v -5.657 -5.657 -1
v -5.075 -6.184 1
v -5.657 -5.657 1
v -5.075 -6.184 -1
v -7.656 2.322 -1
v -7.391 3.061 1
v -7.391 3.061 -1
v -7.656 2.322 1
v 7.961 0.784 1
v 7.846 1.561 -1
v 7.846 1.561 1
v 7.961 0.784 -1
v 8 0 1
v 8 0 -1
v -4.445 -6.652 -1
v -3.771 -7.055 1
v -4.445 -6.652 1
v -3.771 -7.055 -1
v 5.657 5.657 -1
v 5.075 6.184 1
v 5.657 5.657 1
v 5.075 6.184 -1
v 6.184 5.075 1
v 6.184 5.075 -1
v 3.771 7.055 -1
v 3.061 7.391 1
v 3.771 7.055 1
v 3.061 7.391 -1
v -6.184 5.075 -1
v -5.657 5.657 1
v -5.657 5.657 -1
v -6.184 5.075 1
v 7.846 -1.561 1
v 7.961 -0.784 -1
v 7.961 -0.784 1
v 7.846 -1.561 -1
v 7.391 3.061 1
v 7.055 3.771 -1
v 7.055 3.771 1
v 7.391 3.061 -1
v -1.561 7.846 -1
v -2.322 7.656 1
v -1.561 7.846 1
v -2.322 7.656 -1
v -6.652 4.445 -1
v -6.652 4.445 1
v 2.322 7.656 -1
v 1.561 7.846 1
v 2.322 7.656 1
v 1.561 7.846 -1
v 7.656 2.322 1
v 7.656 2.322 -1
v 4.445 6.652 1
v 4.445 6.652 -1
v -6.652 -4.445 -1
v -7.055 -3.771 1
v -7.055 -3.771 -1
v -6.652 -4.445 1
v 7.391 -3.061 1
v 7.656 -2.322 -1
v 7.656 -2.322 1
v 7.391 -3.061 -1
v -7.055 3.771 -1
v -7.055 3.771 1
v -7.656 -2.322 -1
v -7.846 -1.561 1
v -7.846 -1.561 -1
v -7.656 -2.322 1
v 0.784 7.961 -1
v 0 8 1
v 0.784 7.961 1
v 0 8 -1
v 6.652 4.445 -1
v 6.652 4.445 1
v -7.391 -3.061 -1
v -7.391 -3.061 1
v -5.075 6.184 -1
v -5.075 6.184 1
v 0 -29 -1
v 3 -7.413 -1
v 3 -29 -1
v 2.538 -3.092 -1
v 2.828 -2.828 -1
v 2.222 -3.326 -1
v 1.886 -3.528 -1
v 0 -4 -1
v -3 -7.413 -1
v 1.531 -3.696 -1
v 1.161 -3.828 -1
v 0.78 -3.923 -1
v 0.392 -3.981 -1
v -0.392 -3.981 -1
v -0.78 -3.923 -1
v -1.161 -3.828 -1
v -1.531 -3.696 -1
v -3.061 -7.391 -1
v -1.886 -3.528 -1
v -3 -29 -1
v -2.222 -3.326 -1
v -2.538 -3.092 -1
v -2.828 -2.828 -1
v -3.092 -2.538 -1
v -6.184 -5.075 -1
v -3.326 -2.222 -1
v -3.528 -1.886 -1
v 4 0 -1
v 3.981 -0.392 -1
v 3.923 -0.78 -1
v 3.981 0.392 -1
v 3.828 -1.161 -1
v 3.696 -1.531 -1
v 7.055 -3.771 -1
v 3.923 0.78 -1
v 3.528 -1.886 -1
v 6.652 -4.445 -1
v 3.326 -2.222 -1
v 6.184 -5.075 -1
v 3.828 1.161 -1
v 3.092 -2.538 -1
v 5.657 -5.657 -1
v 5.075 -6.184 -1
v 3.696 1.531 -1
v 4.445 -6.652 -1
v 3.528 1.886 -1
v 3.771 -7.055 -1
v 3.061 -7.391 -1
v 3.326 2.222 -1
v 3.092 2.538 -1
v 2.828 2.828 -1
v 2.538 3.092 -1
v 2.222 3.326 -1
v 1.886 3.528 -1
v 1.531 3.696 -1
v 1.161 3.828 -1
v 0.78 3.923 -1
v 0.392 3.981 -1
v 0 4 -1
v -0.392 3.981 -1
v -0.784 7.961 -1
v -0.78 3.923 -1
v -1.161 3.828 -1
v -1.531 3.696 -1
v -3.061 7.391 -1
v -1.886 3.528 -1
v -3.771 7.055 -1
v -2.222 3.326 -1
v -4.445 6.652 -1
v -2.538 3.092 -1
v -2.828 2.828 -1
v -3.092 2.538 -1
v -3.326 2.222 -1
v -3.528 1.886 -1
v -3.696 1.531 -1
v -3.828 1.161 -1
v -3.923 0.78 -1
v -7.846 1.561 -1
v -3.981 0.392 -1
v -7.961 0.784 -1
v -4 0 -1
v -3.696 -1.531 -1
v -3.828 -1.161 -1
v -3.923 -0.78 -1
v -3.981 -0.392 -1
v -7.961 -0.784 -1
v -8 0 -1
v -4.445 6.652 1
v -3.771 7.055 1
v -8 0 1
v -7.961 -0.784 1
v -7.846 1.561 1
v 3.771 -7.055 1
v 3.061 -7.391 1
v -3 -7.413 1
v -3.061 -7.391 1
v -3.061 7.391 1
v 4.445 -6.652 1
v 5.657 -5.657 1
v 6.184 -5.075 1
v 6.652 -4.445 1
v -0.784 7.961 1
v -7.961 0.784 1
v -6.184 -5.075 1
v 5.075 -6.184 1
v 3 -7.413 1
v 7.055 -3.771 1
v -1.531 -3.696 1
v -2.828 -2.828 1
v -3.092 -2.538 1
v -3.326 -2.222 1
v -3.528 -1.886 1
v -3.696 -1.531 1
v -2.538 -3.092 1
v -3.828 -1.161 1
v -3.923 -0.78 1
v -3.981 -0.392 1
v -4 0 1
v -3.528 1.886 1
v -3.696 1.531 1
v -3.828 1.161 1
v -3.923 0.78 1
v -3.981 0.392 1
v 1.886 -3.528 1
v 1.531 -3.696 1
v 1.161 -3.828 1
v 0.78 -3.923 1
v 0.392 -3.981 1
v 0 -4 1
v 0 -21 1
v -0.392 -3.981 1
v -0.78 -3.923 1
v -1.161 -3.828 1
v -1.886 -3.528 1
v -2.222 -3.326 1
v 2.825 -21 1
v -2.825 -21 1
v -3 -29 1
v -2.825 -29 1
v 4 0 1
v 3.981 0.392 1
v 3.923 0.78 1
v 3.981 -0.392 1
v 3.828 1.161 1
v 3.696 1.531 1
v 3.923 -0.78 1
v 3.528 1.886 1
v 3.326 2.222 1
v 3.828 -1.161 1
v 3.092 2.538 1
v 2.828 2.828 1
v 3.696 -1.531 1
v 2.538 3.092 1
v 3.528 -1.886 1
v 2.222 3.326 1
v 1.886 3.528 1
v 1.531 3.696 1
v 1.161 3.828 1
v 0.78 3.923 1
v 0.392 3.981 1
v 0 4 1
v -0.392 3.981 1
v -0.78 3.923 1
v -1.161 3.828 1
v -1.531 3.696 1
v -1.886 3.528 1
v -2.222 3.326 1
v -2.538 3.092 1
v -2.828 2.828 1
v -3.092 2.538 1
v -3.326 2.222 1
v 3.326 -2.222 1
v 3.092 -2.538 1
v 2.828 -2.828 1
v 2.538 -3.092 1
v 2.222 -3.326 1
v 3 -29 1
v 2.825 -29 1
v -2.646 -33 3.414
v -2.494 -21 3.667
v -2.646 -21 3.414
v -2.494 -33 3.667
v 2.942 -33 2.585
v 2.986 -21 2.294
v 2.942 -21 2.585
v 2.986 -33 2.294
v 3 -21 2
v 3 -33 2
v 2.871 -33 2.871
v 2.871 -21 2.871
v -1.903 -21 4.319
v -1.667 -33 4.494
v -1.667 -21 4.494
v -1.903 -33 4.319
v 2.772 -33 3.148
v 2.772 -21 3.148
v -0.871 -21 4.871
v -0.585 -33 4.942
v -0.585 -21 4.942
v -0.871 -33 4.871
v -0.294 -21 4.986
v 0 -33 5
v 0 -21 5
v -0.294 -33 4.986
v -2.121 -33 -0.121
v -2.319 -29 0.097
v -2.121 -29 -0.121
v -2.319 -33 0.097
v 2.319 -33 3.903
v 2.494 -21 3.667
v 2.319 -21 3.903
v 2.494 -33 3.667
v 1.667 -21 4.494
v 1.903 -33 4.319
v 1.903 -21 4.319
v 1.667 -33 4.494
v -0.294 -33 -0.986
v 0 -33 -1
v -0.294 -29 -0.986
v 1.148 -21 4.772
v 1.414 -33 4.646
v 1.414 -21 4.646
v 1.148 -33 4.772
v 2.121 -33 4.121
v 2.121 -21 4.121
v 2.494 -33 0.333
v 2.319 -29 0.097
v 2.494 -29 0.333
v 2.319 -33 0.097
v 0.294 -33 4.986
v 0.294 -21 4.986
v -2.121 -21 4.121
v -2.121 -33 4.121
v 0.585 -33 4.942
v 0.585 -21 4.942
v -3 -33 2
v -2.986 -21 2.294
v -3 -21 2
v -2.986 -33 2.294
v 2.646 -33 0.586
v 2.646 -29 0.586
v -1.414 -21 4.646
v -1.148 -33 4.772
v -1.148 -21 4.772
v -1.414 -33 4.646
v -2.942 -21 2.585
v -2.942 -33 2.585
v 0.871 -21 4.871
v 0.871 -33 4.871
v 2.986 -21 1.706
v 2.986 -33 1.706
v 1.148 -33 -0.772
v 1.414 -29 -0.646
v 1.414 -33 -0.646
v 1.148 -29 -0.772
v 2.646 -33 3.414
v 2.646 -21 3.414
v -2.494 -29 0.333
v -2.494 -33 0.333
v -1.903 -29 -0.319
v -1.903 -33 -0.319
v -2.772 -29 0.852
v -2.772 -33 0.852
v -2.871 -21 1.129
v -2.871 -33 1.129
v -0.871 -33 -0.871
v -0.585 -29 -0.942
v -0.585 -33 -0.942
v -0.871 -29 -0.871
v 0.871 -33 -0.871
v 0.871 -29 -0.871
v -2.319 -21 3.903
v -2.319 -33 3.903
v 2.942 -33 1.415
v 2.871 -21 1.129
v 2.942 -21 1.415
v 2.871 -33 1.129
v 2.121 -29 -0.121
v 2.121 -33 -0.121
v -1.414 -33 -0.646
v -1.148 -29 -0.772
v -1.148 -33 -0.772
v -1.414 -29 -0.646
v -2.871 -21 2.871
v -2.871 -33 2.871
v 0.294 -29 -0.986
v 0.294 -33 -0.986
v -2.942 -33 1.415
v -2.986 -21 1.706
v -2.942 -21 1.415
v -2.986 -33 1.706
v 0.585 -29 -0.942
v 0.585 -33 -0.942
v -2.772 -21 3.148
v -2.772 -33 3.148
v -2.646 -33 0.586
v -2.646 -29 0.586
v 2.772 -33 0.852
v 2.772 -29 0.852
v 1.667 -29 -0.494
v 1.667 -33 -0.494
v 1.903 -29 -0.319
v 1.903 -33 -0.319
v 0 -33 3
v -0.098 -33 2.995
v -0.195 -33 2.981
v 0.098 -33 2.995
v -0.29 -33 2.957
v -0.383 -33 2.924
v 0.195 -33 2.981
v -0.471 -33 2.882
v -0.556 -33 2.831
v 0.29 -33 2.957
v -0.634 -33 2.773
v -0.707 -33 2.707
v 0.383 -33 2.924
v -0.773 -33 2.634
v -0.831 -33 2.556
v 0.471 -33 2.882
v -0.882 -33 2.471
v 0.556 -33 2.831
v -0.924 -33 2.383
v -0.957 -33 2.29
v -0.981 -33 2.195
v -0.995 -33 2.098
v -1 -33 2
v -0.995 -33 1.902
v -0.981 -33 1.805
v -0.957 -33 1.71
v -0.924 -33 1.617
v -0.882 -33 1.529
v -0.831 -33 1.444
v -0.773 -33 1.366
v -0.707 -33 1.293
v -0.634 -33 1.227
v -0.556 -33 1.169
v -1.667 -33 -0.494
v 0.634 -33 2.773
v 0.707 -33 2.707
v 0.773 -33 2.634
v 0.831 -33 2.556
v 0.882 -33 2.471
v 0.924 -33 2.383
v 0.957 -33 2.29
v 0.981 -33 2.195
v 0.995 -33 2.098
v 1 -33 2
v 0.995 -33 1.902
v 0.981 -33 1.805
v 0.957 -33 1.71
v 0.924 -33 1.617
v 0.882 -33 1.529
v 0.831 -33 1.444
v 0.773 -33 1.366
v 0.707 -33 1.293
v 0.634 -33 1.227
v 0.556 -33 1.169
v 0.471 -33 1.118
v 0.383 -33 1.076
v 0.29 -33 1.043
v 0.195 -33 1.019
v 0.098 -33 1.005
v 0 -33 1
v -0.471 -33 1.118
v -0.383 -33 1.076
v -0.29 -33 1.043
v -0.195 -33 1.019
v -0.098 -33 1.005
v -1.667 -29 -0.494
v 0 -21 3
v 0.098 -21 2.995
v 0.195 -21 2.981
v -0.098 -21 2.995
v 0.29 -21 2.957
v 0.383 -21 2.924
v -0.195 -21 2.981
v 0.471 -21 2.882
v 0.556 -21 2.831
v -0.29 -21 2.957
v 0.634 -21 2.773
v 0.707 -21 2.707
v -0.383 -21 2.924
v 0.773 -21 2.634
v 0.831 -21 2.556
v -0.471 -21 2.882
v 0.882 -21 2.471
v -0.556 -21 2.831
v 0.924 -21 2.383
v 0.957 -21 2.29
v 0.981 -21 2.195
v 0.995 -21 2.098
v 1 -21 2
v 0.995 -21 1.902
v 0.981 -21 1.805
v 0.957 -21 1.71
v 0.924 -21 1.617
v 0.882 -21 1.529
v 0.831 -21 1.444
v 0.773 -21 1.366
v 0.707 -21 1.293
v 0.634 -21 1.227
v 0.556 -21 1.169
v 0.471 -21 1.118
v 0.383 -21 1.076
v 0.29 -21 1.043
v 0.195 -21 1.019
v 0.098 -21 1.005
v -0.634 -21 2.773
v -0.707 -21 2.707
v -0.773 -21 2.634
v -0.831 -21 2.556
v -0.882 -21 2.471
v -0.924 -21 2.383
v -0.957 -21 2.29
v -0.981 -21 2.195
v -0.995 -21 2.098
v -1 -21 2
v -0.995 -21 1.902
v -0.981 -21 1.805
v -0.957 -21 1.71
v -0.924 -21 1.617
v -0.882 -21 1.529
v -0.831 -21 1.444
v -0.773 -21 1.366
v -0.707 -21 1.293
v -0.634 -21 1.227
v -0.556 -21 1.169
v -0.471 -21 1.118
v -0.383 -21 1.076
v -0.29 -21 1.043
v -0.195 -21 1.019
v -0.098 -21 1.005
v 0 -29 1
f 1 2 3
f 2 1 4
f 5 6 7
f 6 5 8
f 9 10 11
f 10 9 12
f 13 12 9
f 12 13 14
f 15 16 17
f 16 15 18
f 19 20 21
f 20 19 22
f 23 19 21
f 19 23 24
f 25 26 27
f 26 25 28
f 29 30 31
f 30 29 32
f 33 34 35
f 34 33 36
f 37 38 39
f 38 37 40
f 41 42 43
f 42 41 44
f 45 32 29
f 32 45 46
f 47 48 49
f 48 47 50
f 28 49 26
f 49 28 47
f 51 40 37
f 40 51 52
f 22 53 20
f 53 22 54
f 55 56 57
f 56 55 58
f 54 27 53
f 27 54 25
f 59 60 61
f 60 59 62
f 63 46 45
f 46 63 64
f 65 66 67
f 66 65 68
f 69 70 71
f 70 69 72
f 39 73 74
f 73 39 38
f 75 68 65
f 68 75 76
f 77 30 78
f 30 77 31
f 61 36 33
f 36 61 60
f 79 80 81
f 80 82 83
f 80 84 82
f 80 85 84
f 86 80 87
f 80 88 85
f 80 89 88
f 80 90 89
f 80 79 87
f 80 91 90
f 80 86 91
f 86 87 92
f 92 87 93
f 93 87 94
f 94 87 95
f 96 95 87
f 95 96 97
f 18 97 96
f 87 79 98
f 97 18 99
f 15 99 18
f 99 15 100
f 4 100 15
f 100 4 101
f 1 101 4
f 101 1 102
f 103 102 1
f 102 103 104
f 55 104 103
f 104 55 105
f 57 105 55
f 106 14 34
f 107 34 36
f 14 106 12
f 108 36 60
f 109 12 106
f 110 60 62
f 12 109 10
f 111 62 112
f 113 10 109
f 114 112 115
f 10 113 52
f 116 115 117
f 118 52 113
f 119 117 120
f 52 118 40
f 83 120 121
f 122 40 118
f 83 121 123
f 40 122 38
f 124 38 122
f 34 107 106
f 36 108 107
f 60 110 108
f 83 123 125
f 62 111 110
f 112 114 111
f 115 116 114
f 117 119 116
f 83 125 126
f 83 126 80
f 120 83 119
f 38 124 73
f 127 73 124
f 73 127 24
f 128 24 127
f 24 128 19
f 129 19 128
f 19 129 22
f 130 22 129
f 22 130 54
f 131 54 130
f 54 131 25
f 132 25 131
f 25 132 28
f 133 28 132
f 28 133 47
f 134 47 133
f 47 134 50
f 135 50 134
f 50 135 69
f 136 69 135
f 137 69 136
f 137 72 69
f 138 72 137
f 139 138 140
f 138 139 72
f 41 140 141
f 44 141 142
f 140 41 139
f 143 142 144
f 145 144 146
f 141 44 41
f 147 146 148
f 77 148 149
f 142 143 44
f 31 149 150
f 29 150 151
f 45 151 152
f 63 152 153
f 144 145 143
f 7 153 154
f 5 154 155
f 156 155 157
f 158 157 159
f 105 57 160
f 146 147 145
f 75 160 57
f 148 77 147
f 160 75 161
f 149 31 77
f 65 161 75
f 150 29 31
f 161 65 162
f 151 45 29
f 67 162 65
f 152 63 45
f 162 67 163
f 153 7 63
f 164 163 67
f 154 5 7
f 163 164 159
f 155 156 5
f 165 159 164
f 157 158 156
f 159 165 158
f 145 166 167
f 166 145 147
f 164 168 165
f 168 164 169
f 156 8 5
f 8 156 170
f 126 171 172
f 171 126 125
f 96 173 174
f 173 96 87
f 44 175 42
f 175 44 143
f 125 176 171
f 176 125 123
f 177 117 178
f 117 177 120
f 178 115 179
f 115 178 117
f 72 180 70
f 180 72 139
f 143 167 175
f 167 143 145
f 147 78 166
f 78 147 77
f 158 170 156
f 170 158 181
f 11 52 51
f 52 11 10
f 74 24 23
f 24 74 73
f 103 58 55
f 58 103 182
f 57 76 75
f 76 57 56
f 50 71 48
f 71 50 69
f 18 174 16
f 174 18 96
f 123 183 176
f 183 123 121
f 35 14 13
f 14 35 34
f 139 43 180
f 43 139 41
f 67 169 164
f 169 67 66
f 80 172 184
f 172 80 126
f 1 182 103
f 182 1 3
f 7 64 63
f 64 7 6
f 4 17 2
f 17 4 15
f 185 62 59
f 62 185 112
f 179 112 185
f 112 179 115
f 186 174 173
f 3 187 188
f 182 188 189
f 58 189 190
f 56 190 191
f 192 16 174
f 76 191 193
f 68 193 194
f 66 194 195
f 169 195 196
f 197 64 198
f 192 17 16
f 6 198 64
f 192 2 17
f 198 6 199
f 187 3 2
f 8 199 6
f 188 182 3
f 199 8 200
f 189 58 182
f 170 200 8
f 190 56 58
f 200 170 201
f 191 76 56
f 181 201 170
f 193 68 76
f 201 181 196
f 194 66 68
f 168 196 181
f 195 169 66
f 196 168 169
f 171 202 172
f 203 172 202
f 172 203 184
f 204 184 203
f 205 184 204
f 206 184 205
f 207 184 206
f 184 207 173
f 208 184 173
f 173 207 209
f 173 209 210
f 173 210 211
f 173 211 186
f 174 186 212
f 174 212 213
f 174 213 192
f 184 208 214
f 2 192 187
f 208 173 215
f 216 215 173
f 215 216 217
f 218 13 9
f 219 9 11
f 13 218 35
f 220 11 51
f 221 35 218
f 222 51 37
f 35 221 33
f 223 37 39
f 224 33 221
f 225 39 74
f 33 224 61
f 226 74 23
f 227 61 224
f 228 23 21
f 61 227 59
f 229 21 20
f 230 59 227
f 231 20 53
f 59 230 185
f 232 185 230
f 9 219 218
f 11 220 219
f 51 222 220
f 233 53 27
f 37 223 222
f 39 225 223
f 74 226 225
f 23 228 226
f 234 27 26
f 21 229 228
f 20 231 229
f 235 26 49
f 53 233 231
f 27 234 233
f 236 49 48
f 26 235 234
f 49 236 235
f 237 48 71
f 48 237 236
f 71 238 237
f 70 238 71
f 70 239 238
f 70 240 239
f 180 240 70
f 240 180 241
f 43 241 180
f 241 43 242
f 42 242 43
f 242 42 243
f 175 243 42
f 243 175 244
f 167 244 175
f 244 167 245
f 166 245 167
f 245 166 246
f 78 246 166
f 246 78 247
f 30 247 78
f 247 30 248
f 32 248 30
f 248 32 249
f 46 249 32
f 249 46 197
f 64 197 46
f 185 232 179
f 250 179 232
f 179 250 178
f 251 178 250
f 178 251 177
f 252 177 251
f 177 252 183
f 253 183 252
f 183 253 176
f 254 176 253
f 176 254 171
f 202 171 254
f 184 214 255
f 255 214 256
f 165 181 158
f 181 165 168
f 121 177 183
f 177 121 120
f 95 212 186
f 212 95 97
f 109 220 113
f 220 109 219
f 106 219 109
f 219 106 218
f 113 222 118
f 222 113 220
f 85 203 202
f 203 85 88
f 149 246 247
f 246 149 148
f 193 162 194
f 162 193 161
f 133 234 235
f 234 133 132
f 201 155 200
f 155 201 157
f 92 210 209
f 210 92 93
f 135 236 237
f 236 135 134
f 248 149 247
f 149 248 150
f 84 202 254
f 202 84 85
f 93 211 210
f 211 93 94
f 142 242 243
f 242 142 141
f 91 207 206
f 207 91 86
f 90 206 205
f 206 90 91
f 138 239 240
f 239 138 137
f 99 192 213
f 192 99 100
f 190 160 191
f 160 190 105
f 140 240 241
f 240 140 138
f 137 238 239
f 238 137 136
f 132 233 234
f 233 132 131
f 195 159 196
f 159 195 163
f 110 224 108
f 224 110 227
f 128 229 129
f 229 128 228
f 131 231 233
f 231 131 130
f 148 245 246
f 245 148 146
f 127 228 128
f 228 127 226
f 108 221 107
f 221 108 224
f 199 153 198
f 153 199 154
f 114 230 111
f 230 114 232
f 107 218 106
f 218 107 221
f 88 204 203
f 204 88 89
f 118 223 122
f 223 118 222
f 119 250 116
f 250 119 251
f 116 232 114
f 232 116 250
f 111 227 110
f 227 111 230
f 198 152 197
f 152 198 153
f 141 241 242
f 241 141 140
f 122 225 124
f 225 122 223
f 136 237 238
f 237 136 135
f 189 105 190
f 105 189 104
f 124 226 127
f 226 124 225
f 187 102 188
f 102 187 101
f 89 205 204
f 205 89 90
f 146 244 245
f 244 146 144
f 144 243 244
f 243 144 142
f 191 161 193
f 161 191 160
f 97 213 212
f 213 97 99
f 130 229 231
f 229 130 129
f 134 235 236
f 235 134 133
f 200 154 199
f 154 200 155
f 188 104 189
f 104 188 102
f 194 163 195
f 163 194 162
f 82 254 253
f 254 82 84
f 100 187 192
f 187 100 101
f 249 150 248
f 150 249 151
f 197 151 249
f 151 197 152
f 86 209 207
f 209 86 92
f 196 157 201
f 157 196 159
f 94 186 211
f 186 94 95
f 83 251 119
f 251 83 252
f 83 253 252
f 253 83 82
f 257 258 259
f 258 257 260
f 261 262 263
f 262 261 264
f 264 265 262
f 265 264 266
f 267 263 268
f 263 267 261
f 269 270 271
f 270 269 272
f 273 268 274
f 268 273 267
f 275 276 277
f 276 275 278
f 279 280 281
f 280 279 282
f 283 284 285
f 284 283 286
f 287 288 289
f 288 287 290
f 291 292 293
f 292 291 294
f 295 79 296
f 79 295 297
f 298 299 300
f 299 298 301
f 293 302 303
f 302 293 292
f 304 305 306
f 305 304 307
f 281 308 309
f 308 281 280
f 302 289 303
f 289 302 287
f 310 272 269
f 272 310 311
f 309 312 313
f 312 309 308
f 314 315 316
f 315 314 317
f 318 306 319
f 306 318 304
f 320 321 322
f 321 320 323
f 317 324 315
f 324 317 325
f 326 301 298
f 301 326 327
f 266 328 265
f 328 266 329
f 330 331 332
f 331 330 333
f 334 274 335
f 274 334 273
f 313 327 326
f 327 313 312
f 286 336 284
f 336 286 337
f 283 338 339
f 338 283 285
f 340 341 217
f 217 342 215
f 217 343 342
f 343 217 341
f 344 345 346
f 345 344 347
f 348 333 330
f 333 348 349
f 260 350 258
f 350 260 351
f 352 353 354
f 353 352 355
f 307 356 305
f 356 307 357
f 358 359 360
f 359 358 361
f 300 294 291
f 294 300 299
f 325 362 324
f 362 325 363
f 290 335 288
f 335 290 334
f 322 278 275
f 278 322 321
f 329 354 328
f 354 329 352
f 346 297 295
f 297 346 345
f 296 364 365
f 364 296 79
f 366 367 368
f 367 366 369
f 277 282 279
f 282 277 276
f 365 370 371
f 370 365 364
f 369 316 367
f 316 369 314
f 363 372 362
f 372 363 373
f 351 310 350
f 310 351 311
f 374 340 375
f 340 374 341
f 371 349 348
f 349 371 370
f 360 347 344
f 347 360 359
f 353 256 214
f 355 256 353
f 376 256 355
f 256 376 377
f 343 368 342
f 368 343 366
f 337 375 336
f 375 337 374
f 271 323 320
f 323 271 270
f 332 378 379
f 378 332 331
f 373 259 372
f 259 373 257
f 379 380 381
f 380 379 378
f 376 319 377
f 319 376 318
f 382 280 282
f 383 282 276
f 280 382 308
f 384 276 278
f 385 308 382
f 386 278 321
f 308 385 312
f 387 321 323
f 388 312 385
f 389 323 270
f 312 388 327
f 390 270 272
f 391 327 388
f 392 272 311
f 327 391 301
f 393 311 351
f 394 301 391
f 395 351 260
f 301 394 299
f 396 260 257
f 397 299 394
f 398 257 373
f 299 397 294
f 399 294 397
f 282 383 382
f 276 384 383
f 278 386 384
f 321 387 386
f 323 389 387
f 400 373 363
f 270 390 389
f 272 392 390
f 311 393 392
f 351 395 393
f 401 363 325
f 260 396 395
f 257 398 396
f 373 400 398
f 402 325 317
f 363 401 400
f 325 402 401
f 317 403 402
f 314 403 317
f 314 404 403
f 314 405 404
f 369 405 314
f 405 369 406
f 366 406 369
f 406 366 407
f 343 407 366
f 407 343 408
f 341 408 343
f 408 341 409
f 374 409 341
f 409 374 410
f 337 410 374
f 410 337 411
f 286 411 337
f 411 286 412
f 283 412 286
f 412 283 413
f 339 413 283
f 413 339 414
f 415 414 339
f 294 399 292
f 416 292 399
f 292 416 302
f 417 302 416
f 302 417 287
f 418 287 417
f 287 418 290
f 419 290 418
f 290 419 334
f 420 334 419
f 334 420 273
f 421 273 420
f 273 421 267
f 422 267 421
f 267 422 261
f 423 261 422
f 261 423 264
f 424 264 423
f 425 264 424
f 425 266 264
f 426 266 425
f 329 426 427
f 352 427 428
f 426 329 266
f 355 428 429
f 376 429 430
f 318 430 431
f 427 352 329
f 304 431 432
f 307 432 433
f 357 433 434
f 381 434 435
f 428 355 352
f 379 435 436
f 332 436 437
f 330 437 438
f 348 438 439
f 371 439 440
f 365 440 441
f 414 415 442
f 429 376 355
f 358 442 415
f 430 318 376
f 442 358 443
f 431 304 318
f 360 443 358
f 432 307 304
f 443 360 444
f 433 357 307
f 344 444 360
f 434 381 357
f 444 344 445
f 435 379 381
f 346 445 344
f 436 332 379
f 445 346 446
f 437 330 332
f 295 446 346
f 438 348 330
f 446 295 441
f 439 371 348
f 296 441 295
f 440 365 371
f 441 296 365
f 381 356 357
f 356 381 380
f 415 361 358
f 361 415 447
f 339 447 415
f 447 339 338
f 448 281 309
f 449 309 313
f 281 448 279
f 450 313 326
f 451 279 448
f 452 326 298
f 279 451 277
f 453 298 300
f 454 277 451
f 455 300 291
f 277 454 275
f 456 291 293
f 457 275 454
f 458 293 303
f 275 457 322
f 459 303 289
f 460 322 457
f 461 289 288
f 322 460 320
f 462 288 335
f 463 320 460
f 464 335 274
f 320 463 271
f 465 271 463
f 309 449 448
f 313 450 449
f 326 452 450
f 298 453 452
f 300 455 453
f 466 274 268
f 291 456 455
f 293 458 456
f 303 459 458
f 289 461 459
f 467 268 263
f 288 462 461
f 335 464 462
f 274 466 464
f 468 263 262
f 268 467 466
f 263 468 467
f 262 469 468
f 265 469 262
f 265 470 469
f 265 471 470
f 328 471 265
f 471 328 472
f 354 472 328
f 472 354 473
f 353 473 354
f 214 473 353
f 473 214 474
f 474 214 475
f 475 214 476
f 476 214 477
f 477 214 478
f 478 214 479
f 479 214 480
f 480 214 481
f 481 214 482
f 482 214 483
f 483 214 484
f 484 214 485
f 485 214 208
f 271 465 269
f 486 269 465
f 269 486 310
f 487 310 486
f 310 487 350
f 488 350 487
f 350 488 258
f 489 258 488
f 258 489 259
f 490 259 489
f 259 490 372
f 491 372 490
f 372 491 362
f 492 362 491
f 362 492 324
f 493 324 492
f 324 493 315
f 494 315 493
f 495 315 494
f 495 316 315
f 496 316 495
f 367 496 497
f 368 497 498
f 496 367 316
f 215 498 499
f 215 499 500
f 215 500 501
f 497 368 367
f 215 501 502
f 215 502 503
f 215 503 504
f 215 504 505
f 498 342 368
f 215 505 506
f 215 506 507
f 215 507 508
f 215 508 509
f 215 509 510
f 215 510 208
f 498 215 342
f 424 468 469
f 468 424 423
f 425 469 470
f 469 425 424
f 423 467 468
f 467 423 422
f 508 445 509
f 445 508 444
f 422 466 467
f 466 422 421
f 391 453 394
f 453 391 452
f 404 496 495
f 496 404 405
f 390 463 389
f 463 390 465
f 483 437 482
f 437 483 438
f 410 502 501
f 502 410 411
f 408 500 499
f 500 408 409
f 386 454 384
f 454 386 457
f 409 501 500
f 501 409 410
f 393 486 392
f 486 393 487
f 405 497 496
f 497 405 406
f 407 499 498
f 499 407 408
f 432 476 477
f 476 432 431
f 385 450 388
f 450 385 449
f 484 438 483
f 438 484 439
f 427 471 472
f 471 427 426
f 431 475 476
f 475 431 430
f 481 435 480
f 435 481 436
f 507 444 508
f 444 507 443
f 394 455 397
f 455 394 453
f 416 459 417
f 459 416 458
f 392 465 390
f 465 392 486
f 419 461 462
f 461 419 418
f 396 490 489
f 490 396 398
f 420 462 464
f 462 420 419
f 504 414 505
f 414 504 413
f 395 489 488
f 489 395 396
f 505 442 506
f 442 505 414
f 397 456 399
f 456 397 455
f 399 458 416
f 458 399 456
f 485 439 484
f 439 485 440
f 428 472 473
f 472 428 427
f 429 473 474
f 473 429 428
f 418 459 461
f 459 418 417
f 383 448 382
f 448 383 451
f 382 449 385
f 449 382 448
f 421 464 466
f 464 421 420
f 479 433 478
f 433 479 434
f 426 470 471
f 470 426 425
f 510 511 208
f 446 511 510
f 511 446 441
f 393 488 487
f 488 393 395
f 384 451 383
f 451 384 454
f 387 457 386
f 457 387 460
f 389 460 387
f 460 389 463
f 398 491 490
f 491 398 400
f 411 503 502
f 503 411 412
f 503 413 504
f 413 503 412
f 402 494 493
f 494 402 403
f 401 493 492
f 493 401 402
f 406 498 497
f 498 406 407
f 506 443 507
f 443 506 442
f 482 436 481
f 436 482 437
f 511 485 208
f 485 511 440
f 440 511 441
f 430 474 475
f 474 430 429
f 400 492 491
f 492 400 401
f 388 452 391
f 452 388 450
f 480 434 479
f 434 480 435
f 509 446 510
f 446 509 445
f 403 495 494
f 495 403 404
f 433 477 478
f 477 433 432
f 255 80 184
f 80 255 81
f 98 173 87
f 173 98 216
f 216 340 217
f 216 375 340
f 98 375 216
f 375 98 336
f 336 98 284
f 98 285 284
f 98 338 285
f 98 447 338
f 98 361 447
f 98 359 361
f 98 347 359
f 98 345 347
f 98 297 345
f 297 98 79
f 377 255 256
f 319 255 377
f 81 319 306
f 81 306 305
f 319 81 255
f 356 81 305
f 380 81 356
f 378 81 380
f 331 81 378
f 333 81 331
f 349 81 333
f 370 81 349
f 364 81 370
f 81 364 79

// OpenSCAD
// Parameters
outer_diameter_od_mm = 16; //[8:32:1]
inner_diameter_id_mm = 8; //[4:16:1]
hole_diameter_mm = 0; //[0:10:1]
thickness_t_mm = 2; //[1:4:0.5]
width_w_mm = 6; //[3:12:1]
overall_length_l_mm = 30; //[15:60:1]
crimp_length_mm = 12; //[6:24:1]
bend_or_transition_length_mm = 2; //[1:6:0.5]
tab_angle_deg = 45; //[0:60:1]
has_crimp = 1; //[0:1:1]
eps_mm = 1; //[0.5:2:0.5]

// Ring Terminal - complete geometry
module ring_terminal() {
  color("Silver") {
    difference() {
      // Ring terminal body
      translate([0, 0, 0])
        cylinder(r=outer_diameter_od_mm/2, h=thickness_t_mm, center=true, $fn=64);
      // Ring hole
      translate([0, 0, 0])
        cylinder(r=inner_diameter_id_mm/2, h=thickness_t_mm + 2*eps_mm, center=true, $fn=64);
    }
  }
}

// Tab or Shank - complete geometry
module tab_or_shank() {
  color("Silver") {
    difference() {
      // Tab or shank raw
      translate([0, -(outer_diameter_od_mm/2 + (overall_length_l_mm - outer_diameter_od_mm/2)/2 - eps_mm), 0])
        rotate([tab_angle_deg*(1-has_crimp), 0, 0])
        cube([width_w_mm, overall_length_l_mm - outer_diameter_od_mm/2, thickness_t_mm], center=true);
      // Tab end hole
      if (hole_diameter_mm > 0) {
        translate([0, -(outer_diameter_od_mm/2 + (overall_length_l_mm - outer_diameter_od_mm/2) - width_w_mm/2), 0])
          cylinder(r=hole_diameter_mm/2, h=thickness_t_mm + 2*eps_mm, center=true, $fn=32);
      }
    }
  }
}

// Optional Crimp Barrel - complete geometry
module optional_crimp_barrel() {
  if (has_crimp) {
    color("Silver") {
      difference() {
        // Crimp barrel raw
        translate([0, -(outer_diameter_od_mm/2 + (overall_length_l_mm - outer_diameter_od_mm/2) - eps_mm - bend_or_transition_length_mm), width_w_mm/2 - thickness_t_mm/2])
          rotate([90, 0, 0])
          cylinder(r=width_w_mm/2, h=crimp_length_mm, center=true, $fn=64);
        // Crimp barrel void
        translate([0, -(outer_diameter_od_mm/2 + (overall_length_l_mm - outer_diameter_od_mm/2) - eps_mm - bend_or_transition_length_mm), width_w_mm/2 - thickness_t_mm/2])
          rotate([90, 0, 0])
          cylinder(r=width_w_mm/2 - thickness_t_mm, h=crimp_length_mm + 2*eps_mm, center=true, $fn=64);
      }
    }
  }
}

// Ring Terminal Assembly - complete geometry
module ring_terminal_assembly() {
  union() {
    ring_terminal();
    tab_or_shank();
    optional_crimp_barrel();
  }
}

// Final Assembly
module assembly() {
  ring_terminal_assembly();
}

assembly();
